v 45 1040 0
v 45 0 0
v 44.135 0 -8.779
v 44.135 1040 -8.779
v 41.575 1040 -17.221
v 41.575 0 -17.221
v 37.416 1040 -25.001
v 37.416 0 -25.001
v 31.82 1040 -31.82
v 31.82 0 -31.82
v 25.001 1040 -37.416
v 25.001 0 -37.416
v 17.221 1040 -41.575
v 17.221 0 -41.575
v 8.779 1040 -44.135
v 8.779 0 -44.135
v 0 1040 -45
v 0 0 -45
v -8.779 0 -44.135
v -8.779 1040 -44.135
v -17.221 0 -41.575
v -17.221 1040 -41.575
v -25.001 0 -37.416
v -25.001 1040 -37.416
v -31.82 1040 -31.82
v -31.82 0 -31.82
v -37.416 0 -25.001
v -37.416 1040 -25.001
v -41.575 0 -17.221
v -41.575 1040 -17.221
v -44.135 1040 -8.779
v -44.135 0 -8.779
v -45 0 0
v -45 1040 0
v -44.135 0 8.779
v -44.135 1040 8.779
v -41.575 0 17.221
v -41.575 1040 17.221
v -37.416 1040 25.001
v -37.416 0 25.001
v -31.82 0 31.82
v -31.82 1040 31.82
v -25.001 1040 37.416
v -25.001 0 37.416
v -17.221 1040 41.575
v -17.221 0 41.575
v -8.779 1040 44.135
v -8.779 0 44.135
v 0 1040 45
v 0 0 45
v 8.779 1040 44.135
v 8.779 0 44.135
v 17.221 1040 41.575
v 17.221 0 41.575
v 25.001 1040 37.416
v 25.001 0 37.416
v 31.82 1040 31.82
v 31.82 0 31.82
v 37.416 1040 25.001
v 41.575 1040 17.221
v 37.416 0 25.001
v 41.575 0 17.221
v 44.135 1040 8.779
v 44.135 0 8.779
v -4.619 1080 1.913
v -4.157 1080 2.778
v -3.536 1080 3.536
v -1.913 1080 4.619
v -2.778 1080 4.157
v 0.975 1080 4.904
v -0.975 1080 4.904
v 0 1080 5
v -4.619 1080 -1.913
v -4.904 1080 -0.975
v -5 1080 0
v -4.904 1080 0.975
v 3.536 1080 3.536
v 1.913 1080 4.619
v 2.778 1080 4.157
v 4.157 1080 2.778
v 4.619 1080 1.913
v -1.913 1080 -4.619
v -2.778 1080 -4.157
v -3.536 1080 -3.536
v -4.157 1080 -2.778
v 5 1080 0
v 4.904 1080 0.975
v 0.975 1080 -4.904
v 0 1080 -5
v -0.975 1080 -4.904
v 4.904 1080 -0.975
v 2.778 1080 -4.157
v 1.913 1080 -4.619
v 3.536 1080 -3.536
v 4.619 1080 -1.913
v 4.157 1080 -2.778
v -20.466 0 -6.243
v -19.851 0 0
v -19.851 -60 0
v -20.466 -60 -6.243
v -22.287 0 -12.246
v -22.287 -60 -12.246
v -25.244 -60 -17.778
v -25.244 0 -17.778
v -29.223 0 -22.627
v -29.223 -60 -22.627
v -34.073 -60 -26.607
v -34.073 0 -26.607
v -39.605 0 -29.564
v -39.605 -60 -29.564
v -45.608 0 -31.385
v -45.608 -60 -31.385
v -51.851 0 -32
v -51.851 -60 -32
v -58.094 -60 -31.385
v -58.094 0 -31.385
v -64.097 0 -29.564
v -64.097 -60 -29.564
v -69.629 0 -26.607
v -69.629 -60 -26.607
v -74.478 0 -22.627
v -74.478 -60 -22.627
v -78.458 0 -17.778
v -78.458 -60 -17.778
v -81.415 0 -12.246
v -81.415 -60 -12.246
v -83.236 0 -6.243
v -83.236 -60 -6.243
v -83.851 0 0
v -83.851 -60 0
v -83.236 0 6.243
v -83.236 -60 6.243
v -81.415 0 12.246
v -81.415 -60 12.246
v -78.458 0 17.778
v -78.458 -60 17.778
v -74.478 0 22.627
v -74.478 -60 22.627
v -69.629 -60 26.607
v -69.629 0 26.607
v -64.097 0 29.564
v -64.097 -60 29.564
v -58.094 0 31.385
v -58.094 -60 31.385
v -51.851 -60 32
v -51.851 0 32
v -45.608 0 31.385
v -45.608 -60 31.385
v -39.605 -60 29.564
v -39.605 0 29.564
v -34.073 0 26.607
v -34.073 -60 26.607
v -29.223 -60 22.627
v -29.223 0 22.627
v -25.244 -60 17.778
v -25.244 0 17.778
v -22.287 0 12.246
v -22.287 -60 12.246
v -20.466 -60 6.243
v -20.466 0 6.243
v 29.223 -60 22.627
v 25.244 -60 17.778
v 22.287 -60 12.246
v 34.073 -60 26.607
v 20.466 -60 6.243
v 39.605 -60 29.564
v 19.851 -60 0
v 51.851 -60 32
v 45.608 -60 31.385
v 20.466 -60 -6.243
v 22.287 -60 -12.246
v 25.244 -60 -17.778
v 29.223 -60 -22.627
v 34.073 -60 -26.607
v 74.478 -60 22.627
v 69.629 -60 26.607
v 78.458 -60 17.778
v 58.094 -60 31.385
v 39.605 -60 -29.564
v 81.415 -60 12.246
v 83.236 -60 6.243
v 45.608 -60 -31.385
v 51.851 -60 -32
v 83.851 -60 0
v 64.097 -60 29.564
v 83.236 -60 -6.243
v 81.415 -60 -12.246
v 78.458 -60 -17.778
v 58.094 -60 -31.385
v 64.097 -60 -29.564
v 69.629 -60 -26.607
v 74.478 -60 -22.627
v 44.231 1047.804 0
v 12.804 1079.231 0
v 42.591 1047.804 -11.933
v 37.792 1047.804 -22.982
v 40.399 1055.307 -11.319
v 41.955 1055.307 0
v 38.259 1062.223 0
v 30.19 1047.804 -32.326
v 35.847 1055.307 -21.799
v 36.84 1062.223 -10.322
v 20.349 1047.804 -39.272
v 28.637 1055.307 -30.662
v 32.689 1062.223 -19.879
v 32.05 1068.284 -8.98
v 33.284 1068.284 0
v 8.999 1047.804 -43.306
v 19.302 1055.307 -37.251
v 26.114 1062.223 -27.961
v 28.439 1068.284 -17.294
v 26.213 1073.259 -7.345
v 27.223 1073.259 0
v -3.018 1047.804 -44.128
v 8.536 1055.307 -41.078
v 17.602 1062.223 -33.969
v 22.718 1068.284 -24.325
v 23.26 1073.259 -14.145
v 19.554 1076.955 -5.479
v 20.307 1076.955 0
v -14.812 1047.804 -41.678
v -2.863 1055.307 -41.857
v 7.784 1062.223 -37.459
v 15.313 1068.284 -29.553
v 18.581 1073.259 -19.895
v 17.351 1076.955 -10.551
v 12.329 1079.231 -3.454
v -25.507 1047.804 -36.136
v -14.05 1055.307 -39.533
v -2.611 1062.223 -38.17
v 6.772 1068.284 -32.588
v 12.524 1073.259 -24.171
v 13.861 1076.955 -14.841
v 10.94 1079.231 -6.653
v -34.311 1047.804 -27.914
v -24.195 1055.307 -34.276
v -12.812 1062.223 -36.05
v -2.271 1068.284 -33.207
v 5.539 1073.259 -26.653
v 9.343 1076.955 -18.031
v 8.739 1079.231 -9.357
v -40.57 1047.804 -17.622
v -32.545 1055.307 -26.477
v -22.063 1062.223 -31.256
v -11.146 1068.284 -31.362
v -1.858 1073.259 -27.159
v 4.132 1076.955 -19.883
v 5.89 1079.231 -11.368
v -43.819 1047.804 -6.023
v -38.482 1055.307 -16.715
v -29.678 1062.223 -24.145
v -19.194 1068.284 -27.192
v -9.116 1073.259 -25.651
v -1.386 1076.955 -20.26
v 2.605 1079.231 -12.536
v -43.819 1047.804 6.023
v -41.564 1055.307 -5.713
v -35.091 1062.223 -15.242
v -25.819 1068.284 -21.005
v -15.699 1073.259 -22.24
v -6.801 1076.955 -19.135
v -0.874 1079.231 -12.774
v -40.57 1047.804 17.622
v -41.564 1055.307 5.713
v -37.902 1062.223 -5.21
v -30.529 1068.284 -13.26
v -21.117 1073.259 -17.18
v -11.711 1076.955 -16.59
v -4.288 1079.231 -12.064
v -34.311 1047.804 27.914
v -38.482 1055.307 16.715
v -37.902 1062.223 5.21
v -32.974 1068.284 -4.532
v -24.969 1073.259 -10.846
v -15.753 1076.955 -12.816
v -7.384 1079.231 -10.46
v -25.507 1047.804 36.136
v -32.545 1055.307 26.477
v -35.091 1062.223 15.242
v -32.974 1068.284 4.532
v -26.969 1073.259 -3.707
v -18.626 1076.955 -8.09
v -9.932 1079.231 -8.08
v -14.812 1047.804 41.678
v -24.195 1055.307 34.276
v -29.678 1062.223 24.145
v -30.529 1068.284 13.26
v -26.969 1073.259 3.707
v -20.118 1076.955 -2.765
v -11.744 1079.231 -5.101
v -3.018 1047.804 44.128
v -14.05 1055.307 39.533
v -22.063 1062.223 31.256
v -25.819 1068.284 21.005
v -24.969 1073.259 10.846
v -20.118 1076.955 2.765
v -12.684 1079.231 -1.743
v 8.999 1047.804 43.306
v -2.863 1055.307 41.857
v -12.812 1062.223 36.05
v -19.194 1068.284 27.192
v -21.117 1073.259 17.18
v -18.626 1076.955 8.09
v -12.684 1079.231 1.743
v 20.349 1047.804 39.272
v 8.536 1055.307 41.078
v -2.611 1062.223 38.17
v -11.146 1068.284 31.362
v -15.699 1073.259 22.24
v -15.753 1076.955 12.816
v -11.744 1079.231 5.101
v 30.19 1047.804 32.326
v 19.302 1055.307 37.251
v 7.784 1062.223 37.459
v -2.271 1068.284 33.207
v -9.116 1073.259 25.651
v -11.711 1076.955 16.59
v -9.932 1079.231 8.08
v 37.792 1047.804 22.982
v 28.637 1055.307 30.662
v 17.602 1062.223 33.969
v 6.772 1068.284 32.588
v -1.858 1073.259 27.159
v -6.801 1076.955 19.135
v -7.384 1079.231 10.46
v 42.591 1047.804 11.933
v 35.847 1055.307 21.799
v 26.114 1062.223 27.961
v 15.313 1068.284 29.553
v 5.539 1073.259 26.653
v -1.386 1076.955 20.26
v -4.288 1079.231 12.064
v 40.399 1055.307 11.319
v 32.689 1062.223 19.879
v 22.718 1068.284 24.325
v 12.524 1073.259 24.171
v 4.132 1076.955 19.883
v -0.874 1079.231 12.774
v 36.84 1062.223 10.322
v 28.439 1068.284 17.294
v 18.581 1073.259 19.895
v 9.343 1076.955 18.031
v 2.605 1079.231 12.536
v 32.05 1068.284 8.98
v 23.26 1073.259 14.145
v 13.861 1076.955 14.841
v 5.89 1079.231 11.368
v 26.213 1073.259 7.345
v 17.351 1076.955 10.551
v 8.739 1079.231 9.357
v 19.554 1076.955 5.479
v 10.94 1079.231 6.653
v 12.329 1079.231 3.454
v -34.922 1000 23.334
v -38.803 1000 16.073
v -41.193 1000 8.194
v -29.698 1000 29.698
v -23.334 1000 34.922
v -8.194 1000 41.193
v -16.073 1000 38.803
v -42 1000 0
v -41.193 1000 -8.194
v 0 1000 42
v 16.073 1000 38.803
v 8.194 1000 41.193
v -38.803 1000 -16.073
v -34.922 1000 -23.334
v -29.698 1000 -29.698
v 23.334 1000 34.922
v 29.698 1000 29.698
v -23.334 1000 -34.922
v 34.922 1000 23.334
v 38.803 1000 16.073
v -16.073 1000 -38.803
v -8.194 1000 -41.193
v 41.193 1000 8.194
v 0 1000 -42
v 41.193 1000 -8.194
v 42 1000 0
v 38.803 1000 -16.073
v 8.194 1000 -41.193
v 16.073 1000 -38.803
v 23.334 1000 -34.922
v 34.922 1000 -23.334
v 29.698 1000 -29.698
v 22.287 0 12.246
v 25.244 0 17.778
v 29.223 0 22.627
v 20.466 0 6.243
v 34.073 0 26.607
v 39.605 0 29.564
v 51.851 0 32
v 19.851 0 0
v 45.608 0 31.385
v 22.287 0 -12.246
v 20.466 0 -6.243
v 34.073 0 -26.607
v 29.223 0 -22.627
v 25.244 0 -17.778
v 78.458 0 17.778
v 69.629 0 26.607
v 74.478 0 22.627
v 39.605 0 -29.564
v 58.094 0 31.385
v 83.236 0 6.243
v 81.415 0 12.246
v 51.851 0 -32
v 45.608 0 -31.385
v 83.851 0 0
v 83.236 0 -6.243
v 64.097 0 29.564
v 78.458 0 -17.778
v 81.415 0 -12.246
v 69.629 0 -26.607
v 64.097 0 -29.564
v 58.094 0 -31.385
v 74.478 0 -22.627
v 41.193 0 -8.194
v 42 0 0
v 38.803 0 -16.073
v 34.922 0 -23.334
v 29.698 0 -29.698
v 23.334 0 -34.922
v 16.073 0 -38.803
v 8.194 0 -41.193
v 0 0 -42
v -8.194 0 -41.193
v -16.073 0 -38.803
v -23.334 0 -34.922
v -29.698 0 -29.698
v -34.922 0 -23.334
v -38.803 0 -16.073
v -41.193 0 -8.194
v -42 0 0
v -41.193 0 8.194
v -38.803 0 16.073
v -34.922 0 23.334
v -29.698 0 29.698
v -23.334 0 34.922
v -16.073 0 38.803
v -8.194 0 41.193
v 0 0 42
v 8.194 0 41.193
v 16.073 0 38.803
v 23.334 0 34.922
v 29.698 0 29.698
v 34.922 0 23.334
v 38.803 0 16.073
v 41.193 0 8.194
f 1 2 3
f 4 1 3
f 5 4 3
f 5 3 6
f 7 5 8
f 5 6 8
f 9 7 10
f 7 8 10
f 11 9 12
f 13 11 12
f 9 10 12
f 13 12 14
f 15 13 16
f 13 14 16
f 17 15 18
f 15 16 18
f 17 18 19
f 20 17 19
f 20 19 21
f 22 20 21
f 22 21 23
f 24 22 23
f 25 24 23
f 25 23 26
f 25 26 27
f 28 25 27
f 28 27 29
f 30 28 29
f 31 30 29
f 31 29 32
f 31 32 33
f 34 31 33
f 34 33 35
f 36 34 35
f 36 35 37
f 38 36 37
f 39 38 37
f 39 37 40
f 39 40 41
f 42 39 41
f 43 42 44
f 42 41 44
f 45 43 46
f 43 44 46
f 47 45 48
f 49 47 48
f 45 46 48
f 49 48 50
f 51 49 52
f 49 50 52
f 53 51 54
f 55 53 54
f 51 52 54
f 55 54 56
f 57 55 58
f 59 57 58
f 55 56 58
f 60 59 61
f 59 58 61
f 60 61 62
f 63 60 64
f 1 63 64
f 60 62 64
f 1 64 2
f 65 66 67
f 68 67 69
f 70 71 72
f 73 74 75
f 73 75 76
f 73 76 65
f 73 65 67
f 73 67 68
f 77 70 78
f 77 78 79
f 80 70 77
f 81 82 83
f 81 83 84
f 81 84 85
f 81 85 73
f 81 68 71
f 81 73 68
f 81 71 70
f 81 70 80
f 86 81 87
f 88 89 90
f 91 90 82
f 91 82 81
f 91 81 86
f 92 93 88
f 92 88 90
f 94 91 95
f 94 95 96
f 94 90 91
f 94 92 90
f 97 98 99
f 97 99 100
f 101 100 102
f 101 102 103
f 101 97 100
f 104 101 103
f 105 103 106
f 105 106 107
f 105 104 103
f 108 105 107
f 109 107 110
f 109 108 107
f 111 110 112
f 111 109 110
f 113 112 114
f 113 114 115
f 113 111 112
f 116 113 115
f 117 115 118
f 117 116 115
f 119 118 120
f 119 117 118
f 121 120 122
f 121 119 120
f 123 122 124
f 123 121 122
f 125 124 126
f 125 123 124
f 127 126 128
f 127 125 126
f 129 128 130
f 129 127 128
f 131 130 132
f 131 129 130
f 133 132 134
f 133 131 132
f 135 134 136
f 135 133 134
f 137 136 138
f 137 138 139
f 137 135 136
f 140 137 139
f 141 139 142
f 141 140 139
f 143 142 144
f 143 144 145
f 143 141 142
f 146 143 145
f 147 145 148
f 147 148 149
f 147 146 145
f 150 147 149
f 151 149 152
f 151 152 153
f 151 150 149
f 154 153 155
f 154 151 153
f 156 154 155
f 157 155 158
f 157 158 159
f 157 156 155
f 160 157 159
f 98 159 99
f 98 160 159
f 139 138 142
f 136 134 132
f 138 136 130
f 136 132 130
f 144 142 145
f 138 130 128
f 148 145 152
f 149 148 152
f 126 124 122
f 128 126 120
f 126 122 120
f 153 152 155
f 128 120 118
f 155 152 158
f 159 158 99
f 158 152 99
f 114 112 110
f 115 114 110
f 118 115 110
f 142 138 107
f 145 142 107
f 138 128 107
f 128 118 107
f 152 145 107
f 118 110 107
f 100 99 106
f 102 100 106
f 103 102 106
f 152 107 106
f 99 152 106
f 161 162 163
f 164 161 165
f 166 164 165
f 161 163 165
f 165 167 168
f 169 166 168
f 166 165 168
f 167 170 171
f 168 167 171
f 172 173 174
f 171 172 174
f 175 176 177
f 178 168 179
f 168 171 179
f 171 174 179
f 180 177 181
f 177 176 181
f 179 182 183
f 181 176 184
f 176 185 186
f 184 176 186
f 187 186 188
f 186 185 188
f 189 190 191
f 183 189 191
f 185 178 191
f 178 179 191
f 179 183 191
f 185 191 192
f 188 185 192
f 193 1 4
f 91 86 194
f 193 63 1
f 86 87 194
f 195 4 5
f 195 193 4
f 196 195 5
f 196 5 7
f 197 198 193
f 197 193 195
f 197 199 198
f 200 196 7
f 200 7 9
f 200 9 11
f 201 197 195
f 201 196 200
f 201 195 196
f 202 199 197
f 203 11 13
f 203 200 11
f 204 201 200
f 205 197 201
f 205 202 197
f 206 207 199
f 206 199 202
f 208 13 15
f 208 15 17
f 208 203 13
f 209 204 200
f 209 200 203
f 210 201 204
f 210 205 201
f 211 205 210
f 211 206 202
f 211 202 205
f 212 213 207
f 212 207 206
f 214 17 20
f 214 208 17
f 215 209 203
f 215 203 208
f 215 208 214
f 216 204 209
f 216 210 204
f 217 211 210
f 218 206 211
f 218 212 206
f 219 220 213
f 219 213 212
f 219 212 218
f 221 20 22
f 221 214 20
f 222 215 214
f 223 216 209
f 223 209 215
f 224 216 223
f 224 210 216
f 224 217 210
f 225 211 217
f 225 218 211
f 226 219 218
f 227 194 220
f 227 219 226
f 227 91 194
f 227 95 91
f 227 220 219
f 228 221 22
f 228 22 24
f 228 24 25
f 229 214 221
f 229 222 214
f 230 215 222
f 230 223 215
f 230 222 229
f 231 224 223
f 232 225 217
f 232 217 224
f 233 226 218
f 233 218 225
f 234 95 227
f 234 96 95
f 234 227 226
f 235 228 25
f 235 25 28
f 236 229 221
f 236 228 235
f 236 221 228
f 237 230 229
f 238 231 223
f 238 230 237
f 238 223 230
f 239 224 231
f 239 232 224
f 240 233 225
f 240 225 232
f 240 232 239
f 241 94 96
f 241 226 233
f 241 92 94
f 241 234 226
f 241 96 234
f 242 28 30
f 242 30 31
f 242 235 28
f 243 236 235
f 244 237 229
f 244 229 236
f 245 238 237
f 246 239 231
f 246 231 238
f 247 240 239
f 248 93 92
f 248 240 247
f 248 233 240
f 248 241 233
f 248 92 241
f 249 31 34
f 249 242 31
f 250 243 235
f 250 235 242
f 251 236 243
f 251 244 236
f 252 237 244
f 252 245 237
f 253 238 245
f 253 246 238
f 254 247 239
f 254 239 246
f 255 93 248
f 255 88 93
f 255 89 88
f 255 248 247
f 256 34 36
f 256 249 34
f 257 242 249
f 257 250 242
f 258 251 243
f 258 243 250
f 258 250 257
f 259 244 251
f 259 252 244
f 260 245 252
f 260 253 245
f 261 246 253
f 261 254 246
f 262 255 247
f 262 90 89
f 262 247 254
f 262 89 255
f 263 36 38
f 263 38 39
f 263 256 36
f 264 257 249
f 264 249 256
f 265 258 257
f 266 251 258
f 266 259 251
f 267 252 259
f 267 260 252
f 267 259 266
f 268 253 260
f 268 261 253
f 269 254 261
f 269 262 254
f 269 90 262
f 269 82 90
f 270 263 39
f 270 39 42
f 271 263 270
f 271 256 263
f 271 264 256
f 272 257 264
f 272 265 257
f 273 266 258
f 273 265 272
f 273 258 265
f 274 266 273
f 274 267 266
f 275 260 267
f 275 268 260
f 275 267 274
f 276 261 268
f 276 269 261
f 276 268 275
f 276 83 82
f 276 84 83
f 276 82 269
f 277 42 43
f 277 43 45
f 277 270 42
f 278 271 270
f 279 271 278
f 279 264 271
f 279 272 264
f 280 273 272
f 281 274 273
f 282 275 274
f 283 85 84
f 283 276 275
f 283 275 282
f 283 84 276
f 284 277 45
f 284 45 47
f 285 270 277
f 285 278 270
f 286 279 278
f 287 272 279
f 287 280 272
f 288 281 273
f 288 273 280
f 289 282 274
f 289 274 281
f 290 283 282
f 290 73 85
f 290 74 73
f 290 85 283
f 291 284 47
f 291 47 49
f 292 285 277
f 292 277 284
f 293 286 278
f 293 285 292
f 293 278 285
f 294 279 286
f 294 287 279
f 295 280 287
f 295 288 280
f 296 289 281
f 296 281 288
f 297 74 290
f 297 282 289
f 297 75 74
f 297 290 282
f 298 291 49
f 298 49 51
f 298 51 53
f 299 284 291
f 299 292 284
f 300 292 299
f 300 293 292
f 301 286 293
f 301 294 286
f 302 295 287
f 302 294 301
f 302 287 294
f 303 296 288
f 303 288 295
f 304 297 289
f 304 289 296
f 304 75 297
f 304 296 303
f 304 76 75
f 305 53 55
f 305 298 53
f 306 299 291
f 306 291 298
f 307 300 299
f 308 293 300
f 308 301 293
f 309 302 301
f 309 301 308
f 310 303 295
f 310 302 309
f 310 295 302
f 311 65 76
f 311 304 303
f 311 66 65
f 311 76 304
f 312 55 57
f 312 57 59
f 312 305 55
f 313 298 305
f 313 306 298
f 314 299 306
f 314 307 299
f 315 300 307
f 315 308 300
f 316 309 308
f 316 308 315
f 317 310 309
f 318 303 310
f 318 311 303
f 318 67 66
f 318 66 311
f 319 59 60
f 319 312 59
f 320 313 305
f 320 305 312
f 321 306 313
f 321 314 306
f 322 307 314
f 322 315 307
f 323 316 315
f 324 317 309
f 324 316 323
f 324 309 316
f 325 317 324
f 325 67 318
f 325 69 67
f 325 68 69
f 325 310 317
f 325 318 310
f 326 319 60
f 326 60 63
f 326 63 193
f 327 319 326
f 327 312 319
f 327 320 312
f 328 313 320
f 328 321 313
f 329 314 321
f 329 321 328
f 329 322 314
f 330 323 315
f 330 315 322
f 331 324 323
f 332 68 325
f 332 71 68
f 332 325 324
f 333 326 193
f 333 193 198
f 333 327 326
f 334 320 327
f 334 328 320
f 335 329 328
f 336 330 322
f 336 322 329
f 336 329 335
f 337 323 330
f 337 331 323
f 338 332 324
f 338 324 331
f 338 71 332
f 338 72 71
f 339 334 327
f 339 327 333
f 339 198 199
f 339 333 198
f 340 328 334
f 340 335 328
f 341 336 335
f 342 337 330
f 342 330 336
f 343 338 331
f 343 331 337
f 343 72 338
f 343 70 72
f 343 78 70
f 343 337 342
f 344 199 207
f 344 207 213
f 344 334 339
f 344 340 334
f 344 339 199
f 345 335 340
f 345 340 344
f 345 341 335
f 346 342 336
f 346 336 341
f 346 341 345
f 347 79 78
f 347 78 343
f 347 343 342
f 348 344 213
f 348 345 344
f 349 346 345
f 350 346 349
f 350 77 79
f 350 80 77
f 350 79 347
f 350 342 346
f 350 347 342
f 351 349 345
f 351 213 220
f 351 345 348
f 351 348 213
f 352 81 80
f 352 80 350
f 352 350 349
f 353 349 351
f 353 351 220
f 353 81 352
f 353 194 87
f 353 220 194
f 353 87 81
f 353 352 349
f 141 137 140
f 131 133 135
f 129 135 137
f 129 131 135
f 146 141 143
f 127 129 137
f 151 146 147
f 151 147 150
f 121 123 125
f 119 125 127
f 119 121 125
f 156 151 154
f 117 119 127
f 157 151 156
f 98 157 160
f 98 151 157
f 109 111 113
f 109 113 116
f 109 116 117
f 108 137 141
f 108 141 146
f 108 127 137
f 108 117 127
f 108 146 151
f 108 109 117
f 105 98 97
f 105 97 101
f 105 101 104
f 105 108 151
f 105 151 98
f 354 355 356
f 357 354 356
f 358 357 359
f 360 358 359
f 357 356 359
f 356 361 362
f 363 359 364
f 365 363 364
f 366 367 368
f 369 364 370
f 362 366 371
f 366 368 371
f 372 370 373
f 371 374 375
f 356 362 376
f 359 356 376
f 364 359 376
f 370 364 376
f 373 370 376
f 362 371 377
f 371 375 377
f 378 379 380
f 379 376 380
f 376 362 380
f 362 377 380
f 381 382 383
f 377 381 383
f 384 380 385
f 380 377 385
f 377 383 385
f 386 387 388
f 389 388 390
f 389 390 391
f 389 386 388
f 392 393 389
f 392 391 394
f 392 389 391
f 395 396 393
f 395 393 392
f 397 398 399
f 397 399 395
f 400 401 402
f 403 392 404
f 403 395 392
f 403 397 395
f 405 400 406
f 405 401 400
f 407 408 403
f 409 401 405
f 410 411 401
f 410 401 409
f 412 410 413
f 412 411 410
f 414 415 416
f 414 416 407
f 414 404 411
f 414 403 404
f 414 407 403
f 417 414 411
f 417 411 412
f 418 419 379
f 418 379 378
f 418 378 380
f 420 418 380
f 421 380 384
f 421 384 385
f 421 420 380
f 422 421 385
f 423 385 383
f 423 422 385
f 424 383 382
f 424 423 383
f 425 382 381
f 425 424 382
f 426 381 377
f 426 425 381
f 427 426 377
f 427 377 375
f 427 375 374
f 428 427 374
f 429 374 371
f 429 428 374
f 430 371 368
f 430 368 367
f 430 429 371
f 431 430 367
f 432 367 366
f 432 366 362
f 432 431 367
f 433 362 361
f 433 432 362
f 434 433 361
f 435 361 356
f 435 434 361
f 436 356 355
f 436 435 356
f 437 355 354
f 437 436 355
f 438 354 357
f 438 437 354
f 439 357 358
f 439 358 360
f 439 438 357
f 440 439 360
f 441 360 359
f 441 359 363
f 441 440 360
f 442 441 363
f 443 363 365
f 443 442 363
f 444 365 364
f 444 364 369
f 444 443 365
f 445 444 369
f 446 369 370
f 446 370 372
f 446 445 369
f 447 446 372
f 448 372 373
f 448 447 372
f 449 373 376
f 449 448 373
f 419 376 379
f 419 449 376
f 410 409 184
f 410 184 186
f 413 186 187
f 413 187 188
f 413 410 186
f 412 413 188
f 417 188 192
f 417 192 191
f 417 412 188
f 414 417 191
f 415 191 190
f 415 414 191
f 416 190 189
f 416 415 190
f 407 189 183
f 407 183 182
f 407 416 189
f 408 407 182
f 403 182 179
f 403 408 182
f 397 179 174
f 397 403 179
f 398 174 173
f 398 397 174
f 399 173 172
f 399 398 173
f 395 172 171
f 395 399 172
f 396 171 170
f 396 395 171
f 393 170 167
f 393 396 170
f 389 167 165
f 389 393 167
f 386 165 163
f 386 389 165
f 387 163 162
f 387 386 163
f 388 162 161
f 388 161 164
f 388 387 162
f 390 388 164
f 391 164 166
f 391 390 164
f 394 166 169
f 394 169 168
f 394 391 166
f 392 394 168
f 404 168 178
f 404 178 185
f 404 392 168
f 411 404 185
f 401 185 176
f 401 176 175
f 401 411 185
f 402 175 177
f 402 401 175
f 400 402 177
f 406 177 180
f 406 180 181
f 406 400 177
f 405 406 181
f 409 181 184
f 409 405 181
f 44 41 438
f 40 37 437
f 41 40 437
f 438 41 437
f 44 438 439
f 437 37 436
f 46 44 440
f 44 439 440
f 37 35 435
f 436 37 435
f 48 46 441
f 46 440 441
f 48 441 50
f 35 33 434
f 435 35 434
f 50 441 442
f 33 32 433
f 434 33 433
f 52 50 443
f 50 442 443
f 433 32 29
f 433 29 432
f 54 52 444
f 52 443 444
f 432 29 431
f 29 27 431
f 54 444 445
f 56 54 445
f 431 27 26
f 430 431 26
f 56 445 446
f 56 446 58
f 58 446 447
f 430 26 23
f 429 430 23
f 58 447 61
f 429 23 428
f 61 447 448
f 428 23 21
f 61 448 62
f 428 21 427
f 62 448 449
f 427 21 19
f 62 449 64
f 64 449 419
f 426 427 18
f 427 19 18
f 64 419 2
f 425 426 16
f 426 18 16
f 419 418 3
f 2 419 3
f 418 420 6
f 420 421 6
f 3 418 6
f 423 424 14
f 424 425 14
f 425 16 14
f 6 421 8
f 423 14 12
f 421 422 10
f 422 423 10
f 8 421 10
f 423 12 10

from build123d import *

# Parameters (mm, degrees)
SKETCH1_R             = 45
SKETCH1_R_2           = 42
BOSS_EXTRUDE1_DEPTH   = 1000
SKETCH2_R             = 45
BOSS_EXTRUDE2_DEPTH   = 80
FILLET1_R             = 40
SKETCH3_R             = 32
BOSS_EXTRUDE3_DEPTH   = 60
BOSS_EXTRUDE3_2_DEPTH = 60


with BuildPart() as part:
    # Sketch1 → Boss-Extrude1 (new body)
    with BuildSketch(Plane(origin=(0, 0, 0), x_dir=(1, 0, 0), z_dir=(0, 1, 0))):
        Circle(SKETCH1_R)
        Circle(SKETCH1_R_2, mode=Mode.SUBTRACT)
    extrude(amount=BOSS_EXTRUDE1_DEPTH)

    # Sketch2 → Boss-Extrude2 (add)
    with BuildSketch(Plane(origin=(0, 1000, 0), x_dir=(1, 0, 0), z_dir=(0, 1, 0))):
        Circle(SKETCH2_R)
    extrude(amount=BOSS_EXTRUDE2_DEPTH)

    # Fillet1
    fillet1_edges = [part.edges().sort_by_distance(p)[0] for p in [
        (-45, 1080, 0),
    ]]
    fillet(fillet1_edges, radius=FILLET1_R)


with BuildPart() as body_2:
    # Sketch3 → Boss-Extrude3 (new body)
    with BuildSketch(Plane(origin=(0, 0, 0), x_dir=(1, 0, 0), z_dir=(0, 1, 0))):
        with Locations((51.85084031, 0)):
            Circle(SKETCH3_R)
    extrude(amount=-BOSS_EXTRUDE3_DEPTH)


with BuildPart() as body_3:
    # Sketch3 → Boss-Extrude3 2 (new body)
    with BuildSketch(Plane(origin=(0, 0, 0), x_dir=(1, 0, 0), z_dir=(0, 1, 0))):
        with Locations((-51.85084031, 0)):
            Circle(SKETCH3_R)
    extrude(amount=-BOSS_EXTRUDE3_2_DEPTH)


solid = Compound([part.part, body_2.part, body_3.part])
